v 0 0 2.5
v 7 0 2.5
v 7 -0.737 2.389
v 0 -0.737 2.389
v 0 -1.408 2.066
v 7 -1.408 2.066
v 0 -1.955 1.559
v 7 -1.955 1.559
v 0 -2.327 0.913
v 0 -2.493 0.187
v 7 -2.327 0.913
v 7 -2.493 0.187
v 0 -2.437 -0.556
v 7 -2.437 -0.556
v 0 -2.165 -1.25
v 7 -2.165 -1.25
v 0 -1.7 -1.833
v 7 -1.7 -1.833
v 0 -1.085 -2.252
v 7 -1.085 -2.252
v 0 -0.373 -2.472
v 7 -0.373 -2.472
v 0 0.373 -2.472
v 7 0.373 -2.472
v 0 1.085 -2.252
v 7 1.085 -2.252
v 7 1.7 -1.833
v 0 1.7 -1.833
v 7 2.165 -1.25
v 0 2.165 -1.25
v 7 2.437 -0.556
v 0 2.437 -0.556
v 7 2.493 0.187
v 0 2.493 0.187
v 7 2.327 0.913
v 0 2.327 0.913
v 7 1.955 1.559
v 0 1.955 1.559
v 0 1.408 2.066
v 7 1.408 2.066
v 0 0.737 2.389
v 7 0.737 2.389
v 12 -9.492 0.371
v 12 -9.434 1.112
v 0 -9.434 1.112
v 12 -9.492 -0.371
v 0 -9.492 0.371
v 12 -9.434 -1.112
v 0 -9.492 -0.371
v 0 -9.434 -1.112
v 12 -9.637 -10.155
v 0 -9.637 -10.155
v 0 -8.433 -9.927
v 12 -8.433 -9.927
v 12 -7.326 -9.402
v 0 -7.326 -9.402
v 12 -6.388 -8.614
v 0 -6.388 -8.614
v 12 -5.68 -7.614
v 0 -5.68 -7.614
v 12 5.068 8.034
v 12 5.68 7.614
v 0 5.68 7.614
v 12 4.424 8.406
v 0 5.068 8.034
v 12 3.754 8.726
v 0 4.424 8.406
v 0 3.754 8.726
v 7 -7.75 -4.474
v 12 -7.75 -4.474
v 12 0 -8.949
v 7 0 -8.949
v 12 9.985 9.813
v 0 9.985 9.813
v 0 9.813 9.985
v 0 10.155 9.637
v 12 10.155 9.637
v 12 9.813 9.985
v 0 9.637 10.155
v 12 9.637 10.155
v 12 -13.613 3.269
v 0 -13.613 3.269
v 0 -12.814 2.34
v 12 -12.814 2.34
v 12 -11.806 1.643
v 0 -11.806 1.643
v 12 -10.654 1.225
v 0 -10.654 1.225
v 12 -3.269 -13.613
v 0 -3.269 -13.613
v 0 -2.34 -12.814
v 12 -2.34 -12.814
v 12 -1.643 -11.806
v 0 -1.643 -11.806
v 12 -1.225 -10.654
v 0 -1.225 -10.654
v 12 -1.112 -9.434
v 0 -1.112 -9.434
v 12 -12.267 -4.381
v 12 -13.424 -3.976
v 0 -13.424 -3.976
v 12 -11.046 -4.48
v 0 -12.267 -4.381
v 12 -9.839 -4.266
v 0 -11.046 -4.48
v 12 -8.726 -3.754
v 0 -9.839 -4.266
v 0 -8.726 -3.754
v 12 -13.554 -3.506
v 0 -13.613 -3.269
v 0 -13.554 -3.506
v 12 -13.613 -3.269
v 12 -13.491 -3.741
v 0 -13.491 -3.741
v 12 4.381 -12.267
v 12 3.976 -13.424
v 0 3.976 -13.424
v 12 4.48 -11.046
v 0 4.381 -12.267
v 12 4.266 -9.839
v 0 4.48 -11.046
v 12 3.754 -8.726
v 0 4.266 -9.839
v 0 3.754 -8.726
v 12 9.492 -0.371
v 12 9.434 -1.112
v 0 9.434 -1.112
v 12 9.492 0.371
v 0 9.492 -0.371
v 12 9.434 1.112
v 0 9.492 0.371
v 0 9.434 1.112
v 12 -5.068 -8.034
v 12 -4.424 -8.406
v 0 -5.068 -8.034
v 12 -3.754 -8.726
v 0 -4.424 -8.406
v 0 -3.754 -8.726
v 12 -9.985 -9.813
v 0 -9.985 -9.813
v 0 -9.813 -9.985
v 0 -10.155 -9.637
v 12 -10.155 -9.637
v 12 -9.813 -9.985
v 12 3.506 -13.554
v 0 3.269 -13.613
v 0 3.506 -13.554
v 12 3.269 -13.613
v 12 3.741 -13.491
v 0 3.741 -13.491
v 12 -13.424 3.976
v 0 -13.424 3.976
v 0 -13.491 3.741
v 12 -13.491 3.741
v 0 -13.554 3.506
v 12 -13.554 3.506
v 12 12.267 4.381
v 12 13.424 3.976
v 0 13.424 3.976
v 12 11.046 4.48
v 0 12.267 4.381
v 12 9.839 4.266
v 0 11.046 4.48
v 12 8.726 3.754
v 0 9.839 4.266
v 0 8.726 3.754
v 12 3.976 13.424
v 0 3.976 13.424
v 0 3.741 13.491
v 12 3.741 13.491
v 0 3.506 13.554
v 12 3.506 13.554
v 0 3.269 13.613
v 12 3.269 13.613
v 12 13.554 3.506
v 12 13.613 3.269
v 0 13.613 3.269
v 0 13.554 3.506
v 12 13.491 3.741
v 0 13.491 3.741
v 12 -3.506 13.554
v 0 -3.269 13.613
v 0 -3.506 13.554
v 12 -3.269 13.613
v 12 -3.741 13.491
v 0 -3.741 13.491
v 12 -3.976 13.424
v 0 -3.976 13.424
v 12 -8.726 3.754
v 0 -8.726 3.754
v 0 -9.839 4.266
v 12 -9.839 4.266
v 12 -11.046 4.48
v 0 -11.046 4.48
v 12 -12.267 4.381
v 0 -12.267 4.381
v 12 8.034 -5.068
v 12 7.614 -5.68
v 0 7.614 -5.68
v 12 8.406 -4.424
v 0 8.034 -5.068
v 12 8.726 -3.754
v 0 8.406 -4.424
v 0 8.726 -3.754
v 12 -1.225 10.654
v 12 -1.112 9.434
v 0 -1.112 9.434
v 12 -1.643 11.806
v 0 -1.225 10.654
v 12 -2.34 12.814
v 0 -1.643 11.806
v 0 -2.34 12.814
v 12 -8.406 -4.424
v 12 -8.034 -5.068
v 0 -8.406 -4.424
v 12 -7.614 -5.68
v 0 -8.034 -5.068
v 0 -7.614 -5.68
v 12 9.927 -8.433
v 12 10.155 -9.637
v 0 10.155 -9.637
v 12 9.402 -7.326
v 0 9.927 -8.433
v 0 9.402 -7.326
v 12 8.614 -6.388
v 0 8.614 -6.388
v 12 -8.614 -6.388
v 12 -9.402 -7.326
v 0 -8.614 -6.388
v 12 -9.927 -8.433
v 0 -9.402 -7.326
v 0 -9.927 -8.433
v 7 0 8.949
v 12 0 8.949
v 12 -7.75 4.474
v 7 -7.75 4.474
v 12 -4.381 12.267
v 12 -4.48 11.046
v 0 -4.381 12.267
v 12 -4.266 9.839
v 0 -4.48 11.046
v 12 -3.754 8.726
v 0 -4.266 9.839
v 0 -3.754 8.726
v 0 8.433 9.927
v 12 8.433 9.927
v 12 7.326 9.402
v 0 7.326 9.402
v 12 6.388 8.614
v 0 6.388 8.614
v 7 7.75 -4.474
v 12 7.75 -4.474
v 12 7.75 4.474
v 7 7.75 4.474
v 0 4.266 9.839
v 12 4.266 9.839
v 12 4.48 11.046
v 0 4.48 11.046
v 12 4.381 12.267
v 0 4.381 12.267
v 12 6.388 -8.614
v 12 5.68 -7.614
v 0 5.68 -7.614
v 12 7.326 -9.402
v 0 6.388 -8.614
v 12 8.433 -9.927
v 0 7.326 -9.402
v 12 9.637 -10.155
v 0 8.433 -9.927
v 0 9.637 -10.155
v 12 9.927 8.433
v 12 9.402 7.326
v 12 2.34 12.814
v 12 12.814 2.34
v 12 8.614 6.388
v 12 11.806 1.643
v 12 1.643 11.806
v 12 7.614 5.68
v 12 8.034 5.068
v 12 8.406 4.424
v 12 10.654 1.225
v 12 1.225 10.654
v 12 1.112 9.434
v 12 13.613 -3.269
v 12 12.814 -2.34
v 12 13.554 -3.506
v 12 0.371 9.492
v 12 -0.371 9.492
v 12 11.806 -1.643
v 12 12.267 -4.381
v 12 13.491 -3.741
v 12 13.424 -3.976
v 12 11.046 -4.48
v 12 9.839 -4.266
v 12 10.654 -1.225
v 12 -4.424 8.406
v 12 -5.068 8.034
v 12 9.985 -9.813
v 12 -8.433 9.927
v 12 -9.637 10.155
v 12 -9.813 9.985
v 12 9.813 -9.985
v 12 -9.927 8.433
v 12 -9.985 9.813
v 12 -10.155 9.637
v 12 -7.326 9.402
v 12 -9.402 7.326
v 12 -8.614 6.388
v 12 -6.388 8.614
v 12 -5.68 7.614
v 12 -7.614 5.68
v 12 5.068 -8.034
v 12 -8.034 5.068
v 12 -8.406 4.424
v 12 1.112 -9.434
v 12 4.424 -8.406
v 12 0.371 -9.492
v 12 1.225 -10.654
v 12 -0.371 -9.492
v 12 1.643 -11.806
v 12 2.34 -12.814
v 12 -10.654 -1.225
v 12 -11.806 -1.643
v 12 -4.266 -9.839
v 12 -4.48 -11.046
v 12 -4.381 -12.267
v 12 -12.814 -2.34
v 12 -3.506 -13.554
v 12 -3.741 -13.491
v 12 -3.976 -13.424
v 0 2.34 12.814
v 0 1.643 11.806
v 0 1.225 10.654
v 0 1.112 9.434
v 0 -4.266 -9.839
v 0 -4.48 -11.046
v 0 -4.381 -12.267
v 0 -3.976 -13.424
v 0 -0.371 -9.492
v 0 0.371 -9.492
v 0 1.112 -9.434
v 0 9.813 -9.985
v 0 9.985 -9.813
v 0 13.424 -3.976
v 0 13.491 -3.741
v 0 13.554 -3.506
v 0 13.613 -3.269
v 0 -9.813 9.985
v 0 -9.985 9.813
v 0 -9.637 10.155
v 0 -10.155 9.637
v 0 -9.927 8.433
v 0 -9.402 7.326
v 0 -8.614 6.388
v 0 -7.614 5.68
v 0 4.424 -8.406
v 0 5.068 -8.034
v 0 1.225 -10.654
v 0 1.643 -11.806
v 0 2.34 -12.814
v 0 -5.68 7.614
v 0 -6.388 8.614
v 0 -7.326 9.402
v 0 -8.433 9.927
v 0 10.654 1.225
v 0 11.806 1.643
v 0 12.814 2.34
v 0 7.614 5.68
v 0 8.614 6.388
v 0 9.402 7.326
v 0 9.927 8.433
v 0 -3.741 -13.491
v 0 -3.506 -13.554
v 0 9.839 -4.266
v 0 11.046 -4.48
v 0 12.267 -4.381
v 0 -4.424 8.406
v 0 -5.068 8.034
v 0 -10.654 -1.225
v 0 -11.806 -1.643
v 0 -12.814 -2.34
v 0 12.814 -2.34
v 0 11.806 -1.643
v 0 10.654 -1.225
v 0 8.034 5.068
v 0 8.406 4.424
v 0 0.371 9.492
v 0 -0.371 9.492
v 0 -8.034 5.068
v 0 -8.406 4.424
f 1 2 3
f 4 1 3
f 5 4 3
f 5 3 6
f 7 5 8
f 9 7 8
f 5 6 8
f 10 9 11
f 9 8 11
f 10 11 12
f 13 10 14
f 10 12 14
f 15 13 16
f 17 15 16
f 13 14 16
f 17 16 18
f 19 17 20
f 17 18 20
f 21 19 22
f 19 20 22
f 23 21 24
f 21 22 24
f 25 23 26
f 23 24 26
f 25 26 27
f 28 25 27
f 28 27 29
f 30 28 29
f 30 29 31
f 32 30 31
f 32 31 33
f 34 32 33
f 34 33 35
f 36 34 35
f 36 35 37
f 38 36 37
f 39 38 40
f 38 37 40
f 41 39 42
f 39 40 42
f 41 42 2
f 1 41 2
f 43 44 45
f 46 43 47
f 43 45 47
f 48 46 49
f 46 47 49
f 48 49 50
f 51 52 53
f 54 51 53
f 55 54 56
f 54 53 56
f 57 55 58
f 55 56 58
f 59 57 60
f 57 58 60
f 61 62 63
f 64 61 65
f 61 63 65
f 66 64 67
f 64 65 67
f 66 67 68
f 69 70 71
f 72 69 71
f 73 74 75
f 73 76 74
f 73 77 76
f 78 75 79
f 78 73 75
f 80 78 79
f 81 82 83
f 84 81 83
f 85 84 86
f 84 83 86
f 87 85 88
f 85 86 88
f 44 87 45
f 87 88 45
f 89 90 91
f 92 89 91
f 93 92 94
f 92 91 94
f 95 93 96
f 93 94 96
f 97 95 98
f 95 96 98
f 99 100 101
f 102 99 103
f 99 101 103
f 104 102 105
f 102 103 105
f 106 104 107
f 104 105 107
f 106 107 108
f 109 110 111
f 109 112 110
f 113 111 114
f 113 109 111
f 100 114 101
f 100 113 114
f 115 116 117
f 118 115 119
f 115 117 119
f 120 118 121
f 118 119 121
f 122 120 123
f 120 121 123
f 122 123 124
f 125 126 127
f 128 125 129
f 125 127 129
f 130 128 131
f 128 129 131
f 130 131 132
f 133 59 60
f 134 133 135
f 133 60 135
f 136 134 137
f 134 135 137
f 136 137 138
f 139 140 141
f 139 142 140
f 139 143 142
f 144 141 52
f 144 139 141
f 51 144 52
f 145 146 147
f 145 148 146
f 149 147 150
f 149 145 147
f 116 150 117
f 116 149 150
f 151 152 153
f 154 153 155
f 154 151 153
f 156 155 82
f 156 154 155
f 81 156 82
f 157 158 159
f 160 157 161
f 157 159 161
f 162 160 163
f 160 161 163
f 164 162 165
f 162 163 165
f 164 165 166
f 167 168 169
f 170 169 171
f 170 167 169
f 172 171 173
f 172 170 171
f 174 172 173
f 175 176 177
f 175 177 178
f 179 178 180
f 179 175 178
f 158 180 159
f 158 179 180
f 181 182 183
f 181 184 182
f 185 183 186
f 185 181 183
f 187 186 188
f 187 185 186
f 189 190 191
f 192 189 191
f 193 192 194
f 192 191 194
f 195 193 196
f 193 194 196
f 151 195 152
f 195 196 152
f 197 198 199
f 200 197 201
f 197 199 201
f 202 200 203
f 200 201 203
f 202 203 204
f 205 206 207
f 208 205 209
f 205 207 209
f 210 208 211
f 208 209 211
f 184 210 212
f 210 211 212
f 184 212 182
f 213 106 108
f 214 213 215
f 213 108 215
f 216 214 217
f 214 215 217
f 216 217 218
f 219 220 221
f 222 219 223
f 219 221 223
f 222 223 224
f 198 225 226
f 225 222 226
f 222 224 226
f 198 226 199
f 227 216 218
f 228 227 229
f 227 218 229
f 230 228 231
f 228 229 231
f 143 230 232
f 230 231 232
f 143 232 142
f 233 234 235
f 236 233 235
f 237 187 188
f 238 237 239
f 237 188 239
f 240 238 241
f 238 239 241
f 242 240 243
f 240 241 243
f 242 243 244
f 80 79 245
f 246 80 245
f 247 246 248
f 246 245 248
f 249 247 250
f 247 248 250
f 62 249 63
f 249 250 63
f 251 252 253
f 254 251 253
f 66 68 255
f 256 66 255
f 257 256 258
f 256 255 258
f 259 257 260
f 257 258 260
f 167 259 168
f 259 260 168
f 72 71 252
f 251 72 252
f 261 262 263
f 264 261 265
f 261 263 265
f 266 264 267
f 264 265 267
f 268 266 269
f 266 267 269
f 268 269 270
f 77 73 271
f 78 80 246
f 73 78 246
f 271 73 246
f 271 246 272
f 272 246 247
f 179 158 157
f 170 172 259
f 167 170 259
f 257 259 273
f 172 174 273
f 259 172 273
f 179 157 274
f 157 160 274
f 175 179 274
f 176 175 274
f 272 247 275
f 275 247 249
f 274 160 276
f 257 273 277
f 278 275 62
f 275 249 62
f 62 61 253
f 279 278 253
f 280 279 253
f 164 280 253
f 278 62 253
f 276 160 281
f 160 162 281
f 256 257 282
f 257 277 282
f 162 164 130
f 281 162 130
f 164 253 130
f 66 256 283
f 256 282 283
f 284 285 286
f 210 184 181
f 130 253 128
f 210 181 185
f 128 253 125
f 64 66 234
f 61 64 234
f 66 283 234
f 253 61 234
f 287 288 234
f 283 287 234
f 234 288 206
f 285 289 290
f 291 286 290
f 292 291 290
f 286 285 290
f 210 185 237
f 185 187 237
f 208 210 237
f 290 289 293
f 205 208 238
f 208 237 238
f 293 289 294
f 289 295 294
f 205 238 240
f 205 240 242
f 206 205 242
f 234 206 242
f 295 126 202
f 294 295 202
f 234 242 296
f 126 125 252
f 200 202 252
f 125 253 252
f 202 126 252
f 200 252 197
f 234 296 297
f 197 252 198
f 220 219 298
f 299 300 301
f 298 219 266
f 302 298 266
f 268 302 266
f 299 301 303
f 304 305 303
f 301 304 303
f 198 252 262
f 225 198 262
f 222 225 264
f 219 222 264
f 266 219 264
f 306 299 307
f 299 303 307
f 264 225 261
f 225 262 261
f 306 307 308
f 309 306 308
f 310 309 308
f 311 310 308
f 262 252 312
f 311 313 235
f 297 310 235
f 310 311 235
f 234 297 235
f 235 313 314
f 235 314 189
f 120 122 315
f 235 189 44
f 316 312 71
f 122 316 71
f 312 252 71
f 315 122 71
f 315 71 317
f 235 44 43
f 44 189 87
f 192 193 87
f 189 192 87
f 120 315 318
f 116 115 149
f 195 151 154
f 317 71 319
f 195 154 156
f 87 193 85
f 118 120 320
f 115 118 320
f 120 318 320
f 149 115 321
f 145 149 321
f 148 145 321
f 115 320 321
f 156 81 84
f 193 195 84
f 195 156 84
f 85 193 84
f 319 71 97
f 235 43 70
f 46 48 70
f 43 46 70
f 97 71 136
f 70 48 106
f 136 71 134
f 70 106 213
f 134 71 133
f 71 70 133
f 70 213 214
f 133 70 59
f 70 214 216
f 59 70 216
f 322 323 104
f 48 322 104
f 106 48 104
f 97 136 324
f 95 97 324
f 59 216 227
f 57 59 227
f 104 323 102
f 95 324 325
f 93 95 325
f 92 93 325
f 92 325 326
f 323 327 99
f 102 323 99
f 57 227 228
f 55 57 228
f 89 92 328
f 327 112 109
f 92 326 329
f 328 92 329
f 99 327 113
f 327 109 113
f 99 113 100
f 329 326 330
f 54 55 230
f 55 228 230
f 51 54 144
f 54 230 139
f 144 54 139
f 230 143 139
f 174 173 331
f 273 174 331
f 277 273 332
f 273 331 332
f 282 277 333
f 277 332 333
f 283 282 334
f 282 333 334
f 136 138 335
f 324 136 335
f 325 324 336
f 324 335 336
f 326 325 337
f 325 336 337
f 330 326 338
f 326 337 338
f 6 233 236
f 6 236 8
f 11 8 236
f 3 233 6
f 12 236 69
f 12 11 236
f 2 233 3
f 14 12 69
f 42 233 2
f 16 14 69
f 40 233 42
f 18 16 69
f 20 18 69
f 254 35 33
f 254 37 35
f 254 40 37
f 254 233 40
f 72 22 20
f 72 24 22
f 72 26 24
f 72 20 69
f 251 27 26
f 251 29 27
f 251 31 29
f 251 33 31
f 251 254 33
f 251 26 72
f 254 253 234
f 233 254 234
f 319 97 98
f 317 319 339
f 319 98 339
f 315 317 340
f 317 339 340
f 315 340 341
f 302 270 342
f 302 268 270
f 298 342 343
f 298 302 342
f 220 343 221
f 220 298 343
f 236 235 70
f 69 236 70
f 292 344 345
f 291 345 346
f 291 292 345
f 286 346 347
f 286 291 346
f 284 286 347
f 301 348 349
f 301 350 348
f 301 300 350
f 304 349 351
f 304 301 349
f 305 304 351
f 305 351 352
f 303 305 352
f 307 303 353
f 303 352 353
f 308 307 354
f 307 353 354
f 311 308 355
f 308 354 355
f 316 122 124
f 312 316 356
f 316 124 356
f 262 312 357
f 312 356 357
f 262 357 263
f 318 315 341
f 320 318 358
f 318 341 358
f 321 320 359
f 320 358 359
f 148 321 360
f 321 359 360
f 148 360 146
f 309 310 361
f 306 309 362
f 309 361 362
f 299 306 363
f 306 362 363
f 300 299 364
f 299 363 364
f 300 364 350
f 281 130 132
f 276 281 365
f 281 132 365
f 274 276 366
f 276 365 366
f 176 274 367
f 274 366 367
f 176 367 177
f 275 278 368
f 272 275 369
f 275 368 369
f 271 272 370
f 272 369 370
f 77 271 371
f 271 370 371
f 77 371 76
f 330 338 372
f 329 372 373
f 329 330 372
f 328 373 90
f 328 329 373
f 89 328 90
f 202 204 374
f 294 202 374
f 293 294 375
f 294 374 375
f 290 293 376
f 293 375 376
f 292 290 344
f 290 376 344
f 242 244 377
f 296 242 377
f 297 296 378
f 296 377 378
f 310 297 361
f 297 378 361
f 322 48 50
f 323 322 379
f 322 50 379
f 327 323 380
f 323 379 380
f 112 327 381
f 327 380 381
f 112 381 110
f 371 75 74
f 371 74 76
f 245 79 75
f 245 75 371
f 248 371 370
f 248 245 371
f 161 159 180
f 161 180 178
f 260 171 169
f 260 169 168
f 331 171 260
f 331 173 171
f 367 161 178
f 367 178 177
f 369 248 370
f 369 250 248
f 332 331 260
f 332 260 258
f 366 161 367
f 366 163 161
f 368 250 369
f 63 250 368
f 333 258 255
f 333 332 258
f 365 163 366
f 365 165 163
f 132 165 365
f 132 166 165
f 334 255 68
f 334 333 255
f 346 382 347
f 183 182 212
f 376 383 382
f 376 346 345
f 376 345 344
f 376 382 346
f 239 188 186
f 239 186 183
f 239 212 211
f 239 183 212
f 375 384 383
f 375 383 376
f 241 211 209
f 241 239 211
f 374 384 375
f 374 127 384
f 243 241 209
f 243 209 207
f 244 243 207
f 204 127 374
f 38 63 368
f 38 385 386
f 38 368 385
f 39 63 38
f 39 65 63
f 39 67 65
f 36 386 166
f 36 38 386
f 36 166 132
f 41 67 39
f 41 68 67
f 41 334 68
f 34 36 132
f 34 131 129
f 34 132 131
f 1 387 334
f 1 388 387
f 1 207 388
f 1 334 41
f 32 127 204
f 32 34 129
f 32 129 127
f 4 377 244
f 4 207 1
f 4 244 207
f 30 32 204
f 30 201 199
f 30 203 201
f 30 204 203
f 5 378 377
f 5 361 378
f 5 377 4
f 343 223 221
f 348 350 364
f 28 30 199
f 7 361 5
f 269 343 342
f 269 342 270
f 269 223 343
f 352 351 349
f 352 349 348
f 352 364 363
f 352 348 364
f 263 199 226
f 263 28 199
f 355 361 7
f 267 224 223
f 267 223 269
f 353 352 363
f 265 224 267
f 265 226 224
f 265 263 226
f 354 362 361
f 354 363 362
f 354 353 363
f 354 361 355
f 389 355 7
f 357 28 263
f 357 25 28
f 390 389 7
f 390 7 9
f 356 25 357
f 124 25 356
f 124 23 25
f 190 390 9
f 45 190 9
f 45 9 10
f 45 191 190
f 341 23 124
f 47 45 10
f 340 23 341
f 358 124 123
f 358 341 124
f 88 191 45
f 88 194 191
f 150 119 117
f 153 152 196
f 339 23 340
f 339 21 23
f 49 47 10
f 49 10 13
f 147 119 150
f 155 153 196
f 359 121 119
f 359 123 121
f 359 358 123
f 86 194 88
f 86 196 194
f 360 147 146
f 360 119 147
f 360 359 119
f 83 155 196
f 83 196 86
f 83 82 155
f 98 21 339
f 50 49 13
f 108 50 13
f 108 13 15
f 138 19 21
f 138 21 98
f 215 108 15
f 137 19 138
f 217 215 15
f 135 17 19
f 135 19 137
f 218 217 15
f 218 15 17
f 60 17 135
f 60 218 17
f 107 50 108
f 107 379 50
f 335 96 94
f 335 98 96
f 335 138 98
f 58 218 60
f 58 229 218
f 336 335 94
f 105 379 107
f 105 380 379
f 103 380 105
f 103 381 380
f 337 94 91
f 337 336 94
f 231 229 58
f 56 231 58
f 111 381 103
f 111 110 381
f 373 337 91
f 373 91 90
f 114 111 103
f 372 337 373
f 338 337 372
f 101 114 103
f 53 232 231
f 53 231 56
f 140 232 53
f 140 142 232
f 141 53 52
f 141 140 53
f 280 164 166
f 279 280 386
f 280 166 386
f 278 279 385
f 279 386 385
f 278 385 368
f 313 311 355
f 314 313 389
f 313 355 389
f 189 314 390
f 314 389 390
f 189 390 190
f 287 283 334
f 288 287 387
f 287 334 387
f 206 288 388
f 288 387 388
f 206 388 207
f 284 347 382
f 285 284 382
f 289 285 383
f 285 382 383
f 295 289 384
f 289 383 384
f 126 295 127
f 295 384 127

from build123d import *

# Parameters (mm, degrees)
BASPROSKE_W         = 12
BASPROSKE_H         = 14
TOOTHCUT_DEPTH      = 24.151673806
TEETHCUTS_COUNT     = 12
TEETHCUTS_ANGLE     = 330
BORSKE_R            = 2.5
BORE_DEPTH          = 50.0000508
CUT_EXTRUDE_1_DEPTH = 5


with BuildPart() as part:
    # BasProSke → Base-Revolve (revolve)
    with BuildSketch(Plane(origin=(0, 0, 0), x_dir=(1, 0, 0), z_dir=(0, 1, 0)), mode=Mode.PRIVATE) as base_revolve_sk:
        with Locations((6, 7)):
            Rectangle(BASPROSKE_W, BASPROSKE_H)
    revolve(base_revolve_sk.sketch.rotate(Axis((-10, 0, 0), (1, 0, 0)), 180), axis=Axis((-10, 0, 0), (1, 0, 0)))

    # TooCutSke → ToothCut (cut, through all)
    with BuildSketch(Plane(origin=(0, 0, 0), x_dir=(0, 0, -1), z_dir=(1, 0, 0))):
        with BuildLine():
            ThreePointArc((1.111908866, 9.433698091), (0, 9.499), (-1.111908866, 9.433698091))
            ThreePointArc((-1.111908866, 9.433698091), (-1.651516138, 11.821129337), (-3.298149691, 13.632096456))
            ThreePointArc((-3.298149691, 13.632096456), (0, 14.0254), (3.298149691, 13.632096456))
            ThreePointArc((3.298149691, 13.632096456), (1.651516138, 11.821129337), (1.111908866, 9.433698091))
        make_face()
    toothcut = extrude(amount=TOOTHCUT_DEPTH, mode=Mode.SUBTRACT)

    # TeethCuts: ToothCut ×12 about axis
    teethcuts_axis = Axis((-10, 0, 0), (1, 0, 0))
    for i in range(1, TEETHCUTS_COUNT):
        add(toothcut.rotate(teethcuts_axis, i * TEETHCUTS_ANGLE / (TEETHCUTS_COUNT - 1)), mode=Mode.SUBTRACT)

    # BorSke → Bore (cut, symmetric)
    with BuildSketch(Plane(origin=(0, 0, 0), x_dir=(0, 0, -1), z_dir=(1, 0, 0))):
        with Locations(Location((0, 0, 0), (0, 0, 180))):
            Circle(BORSKE_R)
    extrude(amount=BORE_DEPTH, both=True, mode=Mode.SUBTRACT)

    # Эскиз1 → Вырез-Вытянуть1 (cut)
    with BuildSketch(Plane(origin=(12, 0, 0), x_dir=(0, 0, -1), z_dir=(1, 0, 0))):
        Polygon((8.948929172, 0), (4.474464586, 7.75), (-4.474464586, 7.75), (-8.948929172, 0), (-4.474464586, -7.75), (4.474464586, -7.75), align=None)
    extrude(amount=-CUT_EXTRUDE_1_DEPTH, mode=Mode.SUBTRACT)


solid = part.part
